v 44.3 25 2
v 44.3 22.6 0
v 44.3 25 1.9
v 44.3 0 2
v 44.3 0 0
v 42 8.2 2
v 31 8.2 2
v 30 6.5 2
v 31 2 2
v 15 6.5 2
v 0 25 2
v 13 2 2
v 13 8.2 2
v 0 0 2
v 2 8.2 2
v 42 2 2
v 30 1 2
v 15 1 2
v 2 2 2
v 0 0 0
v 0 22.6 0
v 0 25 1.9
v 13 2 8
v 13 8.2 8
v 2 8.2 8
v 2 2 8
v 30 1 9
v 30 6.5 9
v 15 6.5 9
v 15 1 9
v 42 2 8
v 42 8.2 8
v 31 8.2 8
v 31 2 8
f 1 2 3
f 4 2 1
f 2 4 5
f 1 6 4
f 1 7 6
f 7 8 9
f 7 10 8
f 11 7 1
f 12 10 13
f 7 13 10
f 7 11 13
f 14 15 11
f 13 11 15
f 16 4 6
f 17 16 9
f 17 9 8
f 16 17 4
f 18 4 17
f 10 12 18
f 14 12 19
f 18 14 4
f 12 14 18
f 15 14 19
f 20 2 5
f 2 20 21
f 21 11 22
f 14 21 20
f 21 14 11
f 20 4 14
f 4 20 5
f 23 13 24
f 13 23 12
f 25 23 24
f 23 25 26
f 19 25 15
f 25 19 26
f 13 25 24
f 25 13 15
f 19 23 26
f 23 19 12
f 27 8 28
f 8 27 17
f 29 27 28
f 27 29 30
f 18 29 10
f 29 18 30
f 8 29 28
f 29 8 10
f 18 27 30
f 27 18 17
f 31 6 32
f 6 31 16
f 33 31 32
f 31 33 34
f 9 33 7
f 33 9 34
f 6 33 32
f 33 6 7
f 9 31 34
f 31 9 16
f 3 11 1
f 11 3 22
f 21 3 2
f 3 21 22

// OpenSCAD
cube([44.3,22.5,2]);

translate([2,2,0])
    cube([11.0,6.2,8]);
translate([15,1,0])
    cube([15.0,5.5,9]);    
translate([31,2,0])
    cube([11.0,6.2,8]);

hull()
{
    translate([0,22.5,0])
        cube([44.3,0.1,0.1]);
    translate([0,22.5,1.9])
        cube([44.3,0.1,0.1]);
    translate([0,24.9,1.9])
        cube([44.3,0.1,0.1]);
}
